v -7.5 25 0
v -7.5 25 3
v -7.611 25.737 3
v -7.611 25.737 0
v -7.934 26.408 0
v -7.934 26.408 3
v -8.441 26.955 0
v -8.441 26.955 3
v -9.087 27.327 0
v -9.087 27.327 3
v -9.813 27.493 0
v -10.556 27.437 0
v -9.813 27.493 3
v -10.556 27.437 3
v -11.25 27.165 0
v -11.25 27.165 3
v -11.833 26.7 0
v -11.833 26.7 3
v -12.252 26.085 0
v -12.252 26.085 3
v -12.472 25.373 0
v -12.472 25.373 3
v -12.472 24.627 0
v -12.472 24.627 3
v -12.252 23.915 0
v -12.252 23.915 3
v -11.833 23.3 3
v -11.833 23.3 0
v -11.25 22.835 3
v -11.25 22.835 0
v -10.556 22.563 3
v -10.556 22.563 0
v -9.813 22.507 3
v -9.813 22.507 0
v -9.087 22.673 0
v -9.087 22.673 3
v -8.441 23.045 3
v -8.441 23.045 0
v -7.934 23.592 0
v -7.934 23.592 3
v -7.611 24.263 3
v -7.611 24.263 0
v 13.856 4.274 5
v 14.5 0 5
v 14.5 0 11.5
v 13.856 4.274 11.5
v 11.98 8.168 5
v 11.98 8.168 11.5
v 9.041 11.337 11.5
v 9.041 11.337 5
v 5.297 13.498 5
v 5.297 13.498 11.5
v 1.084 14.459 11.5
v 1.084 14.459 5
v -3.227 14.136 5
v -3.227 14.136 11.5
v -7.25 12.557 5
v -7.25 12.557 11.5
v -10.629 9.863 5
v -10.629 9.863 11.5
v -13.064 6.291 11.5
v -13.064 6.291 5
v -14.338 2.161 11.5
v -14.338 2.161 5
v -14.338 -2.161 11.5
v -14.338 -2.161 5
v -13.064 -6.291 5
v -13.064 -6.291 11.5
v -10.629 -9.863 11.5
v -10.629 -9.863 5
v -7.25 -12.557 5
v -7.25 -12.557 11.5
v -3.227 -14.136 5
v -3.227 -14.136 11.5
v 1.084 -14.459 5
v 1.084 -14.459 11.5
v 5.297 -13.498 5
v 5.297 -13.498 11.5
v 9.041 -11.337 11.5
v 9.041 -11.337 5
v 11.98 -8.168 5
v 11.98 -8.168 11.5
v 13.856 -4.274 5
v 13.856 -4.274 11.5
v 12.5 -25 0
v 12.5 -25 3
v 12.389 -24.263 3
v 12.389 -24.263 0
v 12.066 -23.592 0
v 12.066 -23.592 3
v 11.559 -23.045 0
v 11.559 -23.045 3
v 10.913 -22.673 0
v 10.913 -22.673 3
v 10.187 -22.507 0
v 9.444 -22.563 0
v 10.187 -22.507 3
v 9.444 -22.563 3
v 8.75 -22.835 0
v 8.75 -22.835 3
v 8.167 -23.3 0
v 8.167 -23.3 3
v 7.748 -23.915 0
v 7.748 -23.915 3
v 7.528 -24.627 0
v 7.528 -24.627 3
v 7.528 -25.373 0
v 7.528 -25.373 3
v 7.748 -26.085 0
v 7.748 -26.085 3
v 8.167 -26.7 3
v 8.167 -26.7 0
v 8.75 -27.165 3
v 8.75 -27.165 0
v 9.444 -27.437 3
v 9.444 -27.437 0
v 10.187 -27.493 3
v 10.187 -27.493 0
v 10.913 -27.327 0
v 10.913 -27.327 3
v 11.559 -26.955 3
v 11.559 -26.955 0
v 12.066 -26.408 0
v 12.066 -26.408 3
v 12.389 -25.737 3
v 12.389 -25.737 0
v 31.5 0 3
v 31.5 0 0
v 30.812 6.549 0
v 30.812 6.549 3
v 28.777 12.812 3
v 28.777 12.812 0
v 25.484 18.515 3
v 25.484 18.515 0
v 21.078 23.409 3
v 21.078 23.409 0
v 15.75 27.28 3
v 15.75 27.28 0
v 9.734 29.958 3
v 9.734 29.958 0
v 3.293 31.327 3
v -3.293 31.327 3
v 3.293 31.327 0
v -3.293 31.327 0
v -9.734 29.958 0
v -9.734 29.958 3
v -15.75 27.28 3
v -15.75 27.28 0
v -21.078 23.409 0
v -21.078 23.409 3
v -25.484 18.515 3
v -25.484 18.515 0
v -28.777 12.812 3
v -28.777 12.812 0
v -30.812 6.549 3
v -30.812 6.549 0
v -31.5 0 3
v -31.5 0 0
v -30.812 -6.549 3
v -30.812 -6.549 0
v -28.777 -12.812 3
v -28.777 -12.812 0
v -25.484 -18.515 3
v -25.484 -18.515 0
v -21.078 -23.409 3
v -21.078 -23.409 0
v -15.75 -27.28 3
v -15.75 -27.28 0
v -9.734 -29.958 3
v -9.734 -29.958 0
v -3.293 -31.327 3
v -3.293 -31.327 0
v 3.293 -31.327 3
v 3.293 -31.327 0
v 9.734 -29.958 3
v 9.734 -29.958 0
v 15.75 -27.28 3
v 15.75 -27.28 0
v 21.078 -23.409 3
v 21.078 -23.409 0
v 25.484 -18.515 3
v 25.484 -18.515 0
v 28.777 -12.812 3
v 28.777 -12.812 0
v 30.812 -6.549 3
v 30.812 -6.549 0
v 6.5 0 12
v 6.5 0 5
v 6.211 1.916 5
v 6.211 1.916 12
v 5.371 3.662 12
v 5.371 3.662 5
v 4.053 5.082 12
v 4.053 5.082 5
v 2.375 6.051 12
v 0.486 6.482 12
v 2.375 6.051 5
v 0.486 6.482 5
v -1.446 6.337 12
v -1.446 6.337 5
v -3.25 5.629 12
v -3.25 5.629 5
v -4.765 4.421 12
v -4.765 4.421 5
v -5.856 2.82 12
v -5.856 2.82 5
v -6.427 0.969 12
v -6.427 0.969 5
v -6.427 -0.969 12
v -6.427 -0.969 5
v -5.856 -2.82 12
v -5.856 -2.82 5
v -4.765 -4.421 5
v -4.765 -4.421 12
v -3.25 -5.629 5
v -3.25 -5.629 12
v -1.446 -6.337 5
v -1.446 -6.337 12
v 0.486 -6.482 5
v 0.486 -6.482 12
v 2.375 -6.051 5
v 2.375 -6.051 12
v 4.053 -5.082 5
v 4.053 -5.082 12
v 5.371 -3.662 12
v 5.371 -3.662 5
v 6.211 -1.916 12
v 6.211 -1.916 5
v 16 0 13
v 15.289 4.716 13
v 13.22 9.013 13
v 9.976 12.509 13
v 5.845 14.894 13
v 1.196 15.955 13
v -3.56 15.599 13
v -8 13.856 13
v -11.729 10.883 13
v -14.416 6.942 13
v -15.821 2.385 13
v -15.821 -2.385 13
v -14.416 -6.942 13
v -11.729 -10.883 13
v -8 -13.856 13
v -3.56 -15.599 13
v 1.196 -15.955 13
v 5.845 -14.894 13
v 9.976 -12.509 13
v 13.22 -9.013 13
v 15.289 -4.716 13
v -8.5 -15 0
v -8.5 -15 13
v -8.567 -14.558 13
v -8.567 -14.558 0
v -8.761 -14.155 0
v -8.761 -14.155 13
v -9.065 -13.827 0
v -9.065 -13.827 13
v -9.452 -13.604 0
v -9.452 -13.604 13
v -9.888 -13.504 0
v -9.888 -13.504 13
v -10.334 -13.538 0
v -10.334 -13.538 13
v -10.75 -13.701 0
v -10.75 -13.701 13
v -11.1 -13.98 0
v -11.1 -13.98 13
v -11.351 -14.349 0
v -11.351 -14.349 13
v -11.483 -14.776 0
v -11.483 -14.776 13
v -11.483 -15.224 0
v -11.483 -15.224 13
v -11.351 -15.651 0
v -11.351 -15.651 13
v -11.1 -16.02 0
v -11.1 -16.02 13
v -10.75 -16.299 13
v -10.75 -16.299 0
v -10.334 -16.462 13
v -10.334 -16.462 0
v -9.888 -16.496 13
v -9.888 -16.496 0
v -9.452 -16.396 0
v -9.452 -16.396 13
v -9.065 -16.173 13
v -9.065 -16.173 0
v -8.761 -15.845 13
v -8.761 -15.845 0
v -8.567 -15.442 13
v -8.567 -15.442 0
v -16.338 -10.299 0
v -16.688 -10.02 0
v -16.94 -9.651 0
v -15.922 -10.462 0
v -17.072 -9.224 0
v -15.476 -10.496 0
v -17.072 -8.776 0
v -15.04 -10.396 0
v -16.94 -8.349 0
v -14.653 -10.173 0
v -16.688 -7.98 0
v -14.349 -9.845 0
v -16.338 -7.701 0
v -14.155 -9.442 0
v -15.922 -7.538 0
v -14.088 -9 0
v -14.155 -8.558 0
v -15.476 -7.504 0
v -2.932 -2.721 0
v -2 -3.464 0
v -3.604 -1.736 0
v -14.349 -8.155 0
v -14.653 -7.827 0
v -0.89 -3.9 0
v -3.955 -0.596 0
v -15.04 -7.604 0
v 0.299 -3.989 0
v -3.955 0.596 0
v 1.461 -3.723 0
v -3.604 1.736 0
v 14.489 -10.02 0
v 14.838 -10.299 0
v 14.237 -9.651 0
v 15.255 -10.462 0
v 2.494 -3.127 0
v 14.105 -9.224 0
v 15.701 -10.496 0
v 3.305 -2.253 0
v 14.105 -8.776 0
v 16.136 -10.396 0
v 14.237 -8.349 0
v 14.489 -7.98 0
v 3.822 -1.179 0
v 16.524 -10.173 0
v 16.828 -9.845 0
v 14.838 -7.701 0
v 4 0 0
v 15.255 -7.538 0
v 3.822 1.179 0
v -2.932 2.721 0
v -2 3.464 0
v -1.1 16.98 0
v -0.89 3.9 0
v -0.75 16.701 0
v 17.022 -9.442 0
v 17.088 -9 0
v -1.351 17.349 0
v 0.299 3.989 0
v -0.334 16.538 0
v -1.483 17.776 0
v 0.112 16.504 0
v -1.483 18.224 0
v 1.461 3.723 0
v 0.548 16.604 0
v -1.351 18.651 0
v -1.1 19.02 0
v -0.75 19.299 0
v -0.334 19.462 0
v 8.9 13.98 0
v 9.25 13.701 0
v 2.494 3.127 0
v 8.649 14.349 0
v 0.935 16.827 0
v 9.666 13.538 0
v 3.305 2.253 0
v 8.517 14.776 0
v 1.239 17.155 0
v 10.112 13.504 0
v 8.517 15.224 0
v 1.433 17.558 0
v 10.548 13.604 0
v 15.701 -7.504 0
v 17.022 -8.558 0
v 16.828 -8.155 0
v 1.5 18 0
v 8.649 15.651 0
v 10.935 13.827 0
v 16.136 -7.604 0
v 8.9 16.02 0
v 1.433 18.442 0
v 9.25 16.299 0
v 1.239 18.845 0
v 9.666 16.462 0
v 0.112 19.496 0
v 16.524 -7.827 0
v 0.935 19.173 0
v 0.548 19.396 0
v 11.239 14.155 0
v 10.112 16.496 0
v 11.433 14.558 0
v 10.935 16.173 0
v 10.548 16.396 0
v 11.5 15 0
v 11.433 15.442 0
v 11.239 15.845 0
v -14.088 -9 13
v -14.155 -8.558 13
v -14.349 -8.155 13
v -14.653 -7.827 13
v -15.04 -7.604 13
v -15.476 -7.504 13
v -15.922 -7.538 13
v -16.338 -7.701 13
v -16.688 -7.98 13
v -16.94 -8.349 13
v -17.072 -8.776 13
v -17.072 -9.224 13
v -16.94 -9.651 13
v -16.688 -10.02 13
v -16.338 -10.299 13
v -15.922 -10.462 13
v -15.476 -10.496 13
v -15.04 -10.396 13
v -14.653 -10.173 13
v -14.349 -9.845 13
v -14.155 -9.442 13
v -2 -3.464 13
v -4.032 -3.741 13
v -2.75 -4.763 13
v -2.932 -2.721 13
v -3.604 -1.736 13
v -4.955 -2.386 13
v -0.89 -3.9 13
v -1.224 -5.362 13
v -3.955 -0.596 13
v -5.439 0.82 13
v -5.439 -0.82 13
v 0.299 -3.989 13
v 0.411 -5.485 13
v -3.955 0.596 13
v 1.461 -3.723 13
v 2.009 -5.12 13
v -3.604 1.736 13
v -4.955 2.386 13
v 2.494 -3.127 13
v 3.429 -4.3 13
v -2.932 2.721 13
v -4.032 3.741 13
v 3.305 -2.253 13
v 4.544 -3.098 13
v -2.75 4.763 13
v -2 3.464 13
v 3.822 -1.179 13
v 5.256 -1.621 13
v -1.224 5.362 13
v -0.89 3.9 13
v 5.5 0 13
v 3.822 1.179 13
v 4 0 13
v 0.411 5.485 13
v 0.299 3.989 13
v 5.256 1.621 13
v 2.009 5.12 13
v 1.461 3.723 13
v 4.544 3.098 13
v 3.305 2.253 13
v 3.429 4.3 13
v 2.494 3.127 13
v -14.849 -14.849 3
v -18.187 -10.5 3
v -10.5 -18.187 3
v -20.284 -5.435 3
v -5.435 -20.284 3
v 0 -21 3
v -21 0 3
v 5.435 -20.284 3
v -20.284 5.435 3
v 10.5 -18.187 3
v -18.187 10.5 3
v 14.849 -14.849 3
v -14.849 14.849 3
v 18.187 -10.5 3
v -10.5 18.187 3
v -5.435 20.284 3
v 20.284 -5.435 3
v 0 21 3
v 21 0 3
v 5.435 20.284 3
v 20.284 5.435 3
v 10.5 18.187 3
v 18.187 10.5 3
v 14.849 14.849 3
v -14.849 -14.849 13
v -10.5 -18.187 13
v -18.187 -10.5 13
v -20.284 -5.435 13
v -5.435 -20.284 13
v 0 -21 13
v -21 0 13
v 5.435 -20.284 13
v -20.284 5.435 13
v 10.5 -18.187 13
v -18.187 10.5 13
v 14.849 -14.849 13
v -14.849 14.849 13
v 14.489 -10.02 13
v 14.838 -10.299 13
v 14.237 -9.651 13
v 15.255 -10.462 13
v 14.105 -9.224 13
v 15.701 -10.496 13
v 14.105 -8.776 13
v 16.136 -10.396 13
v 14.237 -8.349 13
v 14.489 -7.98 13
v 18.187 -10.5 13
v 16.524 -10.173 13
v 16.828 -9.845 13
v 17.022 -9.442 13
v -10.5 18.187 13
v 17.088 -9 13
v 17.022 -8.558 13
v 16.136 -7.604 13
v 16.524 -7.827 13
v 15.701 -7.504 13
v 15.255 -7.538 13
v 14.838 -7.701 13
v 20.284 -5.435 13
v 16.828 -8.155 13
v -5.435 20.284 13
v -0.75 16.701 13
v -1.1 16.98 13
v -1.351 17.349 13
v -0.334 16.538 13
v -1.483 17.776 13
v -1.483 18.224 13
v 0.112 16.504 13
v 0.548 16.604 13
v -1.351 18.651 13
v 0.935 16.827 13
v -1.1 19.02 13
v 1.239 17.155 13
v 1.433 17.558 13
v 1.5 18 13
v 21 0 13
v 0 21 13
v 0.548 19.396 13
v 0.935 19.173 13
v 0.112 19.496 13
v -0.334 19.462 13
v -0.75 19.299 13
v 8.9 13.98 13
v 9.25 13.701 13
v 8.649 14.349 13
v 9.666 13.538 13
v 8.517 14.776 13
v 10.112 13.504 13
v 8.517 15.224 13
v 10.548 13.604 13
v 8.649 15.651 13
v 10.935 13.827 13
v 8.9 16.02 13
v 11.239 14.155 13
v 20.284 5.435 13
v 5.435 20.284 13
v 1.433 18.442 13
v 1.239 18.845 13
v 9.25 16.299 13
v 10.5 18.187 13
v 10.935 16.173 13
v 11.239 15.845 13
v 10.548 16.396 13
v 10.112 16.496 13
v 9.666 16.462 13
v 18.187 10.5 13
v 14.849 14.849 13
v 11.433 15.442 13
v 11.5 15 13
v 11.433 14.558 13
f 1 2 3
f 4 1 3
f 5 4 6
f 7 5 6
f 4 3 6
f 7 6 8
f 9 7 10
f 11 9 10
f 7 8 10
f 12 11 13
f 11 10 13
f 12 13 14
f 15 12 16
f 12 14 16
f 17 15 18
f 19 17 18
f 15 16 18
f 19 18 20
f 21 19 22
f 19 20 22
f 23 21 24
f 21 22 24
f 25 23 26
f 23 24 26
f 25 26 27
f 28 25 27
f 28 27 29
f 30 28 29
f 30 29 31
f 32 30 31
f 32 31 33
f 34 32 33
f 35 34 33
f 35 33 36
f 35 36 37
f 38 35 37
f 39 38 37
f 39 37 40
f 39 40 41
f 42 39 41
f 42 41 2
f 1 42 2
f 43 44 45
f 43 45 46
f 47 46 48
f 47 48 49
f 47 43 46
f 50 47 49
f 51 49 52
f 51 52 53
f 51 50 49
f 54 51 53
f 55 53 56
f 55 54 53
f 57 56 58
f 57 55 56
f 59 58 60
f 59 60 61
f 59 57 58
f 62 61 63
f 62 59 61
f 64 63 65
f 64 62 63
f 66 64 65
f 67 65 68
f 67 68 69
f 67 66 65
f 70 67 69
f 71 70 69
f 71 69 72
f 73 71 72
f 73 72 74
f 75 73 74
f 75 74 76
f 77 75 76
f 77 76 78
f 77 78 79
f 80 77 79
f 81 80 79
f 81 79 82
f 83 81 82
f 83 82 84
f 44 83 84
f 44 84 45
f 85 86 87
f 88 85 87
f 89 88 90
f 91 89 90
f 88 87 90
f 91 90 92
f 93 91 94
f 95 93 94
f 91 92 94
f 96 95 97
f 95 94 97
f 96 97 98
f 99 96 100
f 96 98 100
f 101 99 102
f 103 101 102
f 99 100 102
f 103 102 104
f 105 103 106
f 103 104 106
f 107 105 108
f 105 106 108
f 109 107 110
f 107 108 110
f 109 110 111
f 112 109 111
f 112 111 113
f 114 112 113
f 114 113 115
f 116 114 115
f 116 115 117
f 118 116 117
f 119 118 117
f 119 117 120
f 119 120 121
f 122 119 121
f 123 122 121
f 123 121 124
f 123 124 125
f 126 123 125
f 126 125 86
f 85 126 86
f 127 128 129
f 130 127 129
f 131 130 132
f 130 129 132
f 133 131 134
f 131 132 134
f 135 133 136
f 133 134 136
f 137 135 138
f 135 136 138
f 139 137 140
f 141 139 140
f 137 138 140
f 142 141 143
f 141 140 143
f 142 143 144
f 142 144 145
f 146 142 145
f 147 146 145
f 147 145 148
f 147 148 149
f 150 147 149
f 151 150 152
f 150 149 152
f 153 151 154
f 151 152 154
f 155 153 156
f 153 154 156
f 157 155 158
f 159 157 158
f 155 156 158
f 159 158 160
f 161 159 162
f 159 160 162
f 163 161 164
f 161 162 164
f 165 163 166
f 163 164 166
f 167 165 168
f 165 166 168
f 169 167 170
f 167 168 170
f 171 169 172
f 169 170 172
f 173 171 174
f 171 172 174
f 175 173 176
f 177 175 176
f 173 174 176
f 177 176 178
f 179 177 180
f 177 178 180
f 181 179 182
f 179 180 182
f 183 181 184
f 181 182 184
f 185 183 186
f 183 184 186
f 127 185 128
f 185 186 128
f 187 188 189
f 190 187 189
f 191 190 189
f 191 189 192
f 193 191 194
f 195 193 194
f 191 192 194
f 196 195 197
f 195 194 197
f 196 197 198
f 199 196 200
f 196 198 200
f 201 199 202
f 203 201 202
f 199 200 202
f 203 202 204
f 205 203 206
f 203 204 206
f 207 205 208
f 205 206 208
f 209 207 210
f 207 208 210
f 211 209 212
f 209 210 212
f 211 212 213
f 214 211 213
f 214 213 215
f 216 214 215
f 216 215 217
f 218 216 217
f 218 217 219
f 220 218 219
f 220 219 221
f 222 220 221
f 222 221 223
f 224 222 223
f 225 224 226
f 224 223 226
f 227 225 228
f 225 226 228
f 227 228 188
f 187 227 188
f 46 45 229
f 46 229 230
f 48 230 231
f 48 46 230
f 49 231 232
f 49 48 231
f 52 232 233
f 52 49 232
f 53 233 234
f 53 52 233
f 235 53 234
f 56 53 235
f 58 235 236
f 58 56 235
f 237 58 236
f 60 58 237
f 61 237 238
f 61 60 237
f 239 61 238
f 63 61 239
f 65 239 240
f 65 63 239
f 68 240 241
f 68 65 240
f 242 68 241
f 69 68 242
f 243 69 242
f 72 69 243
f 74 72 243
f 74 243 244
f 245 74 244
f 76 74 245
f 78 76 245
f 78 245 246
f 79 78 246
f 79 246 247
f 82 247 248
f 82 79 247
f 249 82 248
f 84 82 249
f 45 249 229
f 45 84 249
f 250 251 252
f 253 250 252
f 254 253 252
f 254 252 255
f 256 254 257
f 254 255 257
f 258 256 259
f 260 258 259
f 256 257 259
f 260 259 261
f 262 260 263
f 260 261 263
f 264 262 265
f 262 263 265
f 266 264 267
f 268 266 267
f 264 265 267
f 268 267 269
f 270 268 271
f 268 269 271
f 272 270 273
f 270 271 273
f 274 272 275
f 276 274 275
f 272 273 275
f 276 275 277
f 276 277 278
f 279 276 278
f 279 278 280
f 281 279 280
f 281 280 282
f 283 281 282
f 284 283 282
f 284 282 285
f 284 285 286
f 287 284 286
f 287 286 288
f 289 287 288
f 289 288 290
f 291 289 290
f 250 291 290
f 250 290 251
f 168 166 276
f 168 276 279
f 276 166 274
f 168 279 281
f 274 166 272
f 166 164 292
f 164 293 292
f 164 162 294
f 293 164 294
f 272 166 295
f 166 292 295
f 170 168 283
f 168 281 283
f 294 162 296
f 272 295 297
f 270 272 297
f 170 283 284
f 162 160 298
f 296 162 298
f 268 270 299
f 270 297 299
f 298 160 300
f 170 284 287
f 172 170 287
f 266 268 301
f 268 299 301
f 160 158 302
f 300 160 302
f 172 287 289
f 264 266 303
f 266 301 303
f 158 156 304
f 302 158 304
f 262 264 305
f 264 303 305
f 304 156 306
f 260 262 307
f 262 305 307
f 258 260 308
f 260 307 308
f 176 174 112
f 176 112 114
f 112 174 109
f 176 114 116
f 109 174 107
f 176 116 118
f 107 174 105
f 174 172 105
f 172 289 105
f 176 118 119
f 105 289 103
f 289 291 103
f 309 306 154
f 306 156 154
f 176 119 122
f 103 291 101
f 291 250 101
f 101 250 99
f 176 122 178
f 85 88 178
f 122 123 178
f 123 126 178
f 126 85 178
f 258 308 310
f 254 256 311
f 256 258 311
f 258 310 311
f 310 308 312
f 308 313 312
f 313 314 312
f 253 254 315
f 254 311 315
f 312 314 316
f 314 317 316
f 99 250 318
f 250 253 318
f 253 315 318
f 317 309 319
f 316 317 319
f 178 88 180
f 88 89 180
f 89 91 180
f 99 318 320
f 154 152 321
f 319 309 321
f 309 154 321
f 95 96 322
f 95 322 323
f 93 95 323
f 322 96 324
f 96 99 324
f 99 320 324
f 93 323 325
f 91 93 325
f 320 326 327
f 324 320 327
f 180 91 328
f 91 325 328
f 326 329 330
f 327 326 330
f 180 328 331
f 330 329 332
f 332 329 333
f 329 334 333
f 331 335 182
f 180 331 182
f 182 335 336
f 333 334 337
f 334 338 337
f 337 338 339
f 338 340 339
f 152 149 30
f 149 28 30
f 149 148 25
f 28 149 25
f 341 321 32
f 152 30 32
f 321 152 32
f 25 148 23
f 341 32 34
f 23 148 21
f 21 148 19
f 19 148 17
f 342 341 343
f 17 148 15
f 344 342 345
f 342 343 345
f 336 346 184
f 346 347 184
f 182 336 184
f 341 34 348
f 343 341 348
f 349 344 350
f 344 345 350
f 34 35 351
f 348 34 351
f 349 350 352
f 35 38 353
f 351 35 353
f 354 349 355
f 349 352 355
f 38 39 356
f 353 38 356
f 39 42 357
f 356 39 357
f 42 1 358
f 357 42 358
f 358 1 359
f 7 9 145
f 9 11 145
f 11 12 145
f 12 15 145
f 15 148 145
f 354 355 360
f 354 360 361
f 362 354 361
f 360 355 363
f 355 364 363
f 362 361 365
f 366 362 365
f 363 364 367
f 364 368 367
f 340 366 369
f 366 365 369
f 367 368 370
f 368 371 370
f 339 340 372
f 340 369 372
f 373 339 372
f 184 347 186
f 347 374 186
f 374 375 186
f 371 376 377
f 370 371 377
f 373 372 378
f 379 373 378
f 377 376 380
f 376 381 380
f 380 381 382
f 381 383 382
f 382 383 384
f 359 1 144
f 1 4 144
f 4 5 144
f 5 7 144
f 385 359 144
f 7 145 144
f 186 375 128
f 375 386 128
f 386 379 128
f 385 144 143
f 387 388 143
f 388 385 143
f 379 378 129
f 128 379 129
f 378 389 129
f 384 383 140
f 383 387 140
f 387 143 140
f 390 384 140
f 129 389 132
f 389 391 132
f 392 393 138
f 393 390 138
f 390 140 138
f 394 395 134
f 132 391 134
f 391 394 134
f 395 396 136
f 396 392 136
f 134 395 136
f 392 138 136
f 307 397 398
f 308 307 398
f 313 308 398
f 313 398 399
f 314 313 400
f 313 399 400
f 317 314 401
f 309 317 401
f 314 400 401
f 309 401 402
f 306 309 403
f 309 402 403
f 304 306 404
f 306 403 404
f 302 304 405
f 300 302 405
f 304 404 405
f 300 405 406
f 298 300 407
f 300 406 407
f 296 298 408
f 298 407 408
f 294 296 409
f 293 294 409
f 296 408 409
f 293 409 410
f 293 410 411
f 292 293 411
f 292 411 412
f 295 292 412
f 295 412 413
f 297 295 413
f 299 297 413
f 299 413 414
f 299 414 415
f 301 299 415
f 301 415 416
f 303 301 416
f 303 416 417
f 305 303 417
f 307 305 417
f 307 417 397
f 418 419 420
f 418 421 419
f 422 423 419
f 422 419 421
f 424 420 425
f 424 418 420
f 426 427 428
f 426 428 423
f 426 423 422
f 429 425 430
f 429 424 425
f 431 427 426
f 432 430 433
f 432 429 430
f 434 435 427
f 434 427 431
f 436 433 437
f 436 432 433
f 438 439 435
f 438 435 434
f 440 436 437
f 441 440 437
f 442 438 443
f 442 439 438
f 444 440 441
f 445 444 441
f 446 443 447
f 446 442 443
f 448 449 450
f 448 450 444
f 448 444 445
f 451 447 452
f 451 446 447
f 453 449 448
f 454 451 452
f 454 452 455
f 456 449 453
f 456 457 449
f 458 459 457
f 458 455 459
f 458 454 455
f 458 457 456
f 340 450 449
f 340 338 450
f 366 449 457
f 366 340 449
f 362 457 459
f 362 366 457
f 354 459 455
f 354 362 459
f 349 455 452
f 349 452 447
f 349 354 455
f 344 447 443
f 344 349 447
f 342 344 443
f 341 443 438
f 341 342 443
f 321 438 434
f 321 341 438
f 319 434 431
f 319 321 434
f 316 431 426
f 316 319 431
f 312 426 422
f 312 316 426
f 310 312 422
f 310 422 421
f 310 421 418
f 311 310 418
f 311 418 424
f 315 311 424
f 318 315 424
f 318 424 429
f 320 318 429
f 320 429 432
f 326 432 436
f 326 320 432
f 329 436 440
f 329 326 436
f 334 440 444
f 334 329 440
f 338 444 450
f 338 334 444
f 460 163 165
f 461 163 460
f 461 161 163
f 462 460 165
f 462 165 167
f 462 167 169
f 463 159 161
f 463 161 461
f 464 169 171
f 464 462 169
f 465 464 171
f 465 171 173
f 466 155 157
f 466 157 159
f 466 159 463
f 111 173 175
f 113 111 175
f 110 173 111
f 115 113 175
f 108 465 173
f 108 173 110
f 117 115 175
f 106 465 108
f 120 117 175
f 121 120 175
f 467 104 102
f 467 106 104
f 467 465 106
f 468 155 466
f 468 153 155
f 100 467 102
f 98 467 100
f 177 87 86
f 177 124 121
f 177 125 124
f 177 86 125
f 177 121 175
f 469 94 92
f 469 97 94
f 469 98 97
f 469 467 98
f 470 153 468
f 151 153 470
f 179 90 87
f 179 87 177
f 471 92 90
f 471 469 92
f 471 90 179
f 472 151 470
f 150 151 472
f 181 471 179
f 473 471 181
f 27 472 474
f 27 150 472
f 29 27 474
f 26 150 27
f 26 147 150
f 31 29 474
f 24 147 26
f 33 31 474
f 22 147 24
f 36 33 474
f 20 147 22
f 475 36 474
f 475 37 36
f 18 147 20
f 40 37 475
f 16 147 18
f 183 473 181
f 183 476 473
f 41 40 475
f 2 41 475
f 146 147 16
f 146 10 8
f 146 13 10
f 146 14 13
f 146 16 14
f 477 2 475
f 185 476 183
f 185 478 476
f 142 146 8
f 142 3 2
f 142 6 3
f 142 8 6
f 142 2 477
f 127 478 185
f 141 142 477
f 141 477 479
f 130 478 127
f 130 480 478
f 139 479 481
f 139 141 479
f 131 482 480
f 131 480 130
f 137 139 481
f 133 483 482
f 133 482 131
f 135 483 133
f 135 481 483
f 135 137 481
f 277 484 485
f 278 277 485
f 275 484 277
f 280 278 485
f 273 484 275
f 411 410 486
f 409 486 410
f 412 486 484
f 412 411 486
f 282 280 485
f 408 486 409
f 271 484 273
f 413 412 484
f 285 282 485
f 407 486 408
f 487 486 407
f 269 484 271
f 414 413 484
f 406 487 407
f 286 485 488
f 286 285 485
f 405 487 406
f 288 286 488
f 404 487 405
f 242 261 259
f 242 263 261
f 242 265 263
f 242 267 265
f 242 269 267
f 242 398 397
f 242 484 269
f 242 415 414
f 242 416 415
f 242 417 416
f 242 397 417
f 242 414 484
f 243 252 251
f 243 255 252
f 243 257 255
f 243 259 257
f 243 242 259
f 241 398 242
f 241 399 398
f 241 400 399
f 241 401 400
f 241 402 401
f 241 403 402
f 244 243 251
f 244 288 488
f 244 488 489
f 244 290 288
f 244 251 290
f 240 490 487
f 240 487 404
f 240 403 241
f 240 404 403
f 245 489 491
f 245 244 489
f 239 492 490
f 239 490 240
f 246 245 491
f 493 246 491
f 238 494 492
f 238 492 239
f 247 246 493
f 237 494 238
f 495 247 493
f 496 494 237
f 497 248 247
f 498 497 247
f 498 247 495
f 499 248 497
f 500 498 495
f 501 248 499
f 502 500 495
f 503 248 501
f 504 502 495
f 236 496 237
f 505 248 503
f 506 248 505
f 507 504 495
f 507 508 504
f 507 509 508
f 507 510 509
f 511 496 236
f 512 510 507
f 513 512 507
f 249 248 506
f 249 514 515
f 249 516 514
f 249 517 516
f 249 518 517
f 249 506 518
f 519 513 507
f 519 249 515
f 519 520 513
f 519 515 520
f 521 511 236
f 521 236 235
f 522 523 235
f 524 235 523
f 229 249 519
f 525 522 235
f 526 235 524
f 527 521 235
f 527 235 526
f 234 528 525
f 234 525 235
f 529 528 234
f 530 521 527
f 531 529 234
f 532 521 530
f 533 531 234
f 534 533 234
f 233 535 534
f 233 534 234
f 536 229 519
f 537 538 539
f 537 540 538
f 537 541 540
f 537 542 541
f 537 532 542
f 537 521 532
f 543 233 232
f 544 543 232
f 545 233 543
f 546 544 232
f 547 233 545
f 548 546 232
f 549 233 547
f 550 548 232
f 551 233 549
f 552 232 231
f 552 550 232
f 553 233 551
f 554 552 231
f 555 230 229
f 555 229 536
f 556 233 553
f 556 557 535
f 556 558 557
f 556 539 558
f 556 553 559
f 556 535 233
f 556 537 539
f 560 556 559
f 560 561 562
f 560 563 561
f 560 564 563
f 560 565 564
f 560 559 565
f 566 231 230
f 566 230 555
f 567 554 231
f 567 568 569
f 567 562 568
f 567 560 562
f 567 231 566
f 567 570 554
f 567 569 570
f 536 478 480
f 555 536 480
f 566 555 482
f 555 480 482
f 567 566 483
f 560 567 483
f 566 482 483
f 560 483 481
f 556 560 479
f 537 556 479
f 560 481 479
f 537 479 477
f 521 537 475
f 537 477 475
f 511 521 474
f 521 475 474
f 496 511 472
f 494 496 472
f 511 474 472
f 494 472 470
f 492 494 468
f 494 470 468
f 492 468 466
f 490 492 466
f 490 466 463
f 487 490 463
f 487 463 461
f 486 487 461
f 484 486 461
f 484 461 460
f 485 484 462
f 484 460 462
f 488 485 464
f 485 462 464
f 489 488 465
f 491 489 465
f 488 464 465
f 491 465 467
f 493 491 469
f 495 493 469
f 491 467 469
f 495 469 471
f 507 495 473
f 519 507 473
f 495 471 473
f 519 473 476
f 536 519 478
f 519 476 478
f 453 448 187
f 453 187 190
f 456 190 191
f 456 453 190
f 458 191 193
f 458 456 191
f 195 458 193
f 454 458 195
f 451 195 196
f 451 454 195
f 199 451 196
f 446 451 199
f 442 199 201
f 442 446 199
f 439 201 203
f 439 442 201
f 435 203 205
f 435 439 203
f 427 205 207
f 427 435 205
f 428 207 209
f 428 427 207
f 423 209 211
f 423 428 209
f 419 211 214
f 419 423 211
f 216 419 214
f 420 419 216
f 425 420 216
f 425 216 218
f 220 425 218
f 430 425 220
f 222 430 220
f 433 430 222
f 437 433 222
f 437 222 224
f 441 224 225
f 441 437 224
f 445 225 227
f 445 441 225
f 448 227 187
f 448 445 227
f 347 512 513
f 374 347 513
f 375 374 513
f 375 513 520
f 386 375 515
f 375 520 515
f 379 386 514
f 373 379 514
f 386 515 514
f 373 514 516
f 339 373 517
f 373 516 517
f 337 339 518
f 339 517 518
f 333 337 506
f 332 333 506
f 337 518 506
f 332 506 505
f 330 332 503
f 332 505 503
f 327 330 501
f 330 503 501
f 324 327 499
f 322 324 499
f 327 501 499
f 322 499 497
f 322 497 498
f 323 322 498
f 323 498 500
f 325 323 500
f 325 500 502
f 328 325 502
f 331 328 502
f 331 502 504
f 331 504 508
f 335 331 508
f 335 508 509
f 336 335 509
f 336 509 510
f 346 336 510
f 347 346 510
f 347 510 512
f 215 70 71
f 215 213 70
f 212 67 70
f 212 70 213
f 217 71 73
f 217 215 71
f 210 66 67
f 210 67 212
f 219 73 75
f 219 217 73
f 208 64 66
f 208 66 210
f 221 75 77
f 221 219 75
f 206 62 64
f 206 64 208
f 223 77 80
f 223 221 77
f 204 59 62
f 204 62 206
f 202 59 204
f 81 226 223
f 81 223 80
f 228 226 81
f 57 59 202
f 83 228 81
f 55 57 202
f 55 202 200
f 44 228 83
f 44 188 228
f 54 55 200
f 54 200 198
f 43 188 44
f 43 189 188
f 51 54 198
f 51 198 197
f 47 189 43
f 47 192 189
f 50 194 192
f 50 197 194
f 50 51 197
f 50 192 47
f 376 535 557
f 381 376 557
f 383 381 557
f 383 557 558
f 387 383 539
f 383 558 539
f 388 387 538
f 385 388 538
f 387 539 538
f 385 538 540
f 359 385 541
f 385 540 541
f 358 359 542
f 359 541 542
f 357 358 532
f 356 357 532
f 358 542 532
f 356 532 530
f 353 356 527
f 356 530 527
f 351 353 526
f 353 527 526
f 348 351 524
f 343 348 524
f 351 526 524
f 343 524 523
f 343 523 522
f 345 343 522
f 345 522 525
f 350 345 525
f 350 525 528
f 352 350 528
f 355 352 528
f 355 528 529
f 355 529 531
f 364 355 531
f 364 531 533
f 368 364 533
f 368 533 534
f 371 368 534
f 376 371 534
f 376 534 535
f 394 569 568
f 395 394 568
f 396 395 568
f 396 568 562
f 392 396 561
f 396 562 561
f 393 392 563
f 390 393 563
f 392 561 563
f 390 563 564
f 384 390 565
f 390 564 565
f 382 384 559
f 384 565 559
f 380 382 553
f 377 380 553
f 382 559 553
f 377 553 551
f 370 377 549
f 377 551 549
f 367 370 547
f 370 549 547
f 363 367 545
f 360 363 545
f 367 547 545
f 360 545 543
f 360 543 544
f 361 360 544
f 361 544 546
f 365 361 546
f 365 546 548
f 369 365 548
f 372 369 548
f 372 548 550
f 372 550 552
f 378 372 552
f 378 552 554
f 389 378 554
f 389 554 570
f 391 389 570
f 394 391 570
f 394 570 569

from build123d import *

# Parameters (mm, degrees)
SKETCH_R        = 31.5
SKETCH_R_2      = 4
PAD_DEPTH       = 3
SKETCH001_R     = 21
SKETCH001_R_2   = 14.5
PAD001_DEPTH    = 10
SKETCH002_R     = 14.5
SKETCH002_R_2   = 4
PAD002_DEPTH    = 2
SKETCH003_R     = 6.5
SKETCH003_R_2   = 4
PAD003_DEPTH    = 8
SKETCH005_R     = 2.5
SKETCH005_R_2   = 1.5
POCKET001_DEPTH = 3.001
SKETCH008_R     = 1.5
POCKET_DEPTH    = 13.001
SKETCH007_R     = 1.5
POCKET002_DEPTH = 13.001
CHAMFER_SIZE    = 1.5
CHAMFER001_SIZE = 1


with BuildPart() as part:
    # Sketch → Pad (new body)
    with BuildSketch(Plane.XY):
        Circle(SKETCH_R)
        Circle(SKETCH_R_2, mode=Mode.SUBTRACT)
    extrude(amount=PAD_DEPTH)

    # Sketch001 (on Face4 of Pad) → Pad001 (join)
    with BuildSketch(Plane.XY.offset(3)):
        Circle(SKETCH001_R)
        Circle(SKETCH001_R_2, mode=Mode.SUBTRACT)
    extrude(amount=PAD001_DEPTH)

    # Sketch002 (on Face6 of Pad001) → Pad002 (join)
    with BuildSketch(Plane.XY.offset(3)):
        Circle(SKETCH002_R)
        Circle(SKETCH002_R_2, mode=Mode.SUBTRACT)
    extrude(amount=PAD002_DEPTH)

    # Sketch003 (on Face8 of Pad002) → Pad003 (join)
    with BuildSketch(Plane.XY.offset(5)):
        Circle(SKETCH003_R)
        Circle(SKETCH003_R_2, mode=Mode.SUBTRACT)
    extrude(amount=PAD003_DEPTH)

    # Sketch005 (on Face3 of Pad001) → Pocket001 (cut, through all)
    with BuildSketch(Plane.XY.offset(3)):
        with Locations((-10, 25)):
            Circle(SKETCH005_R)
        with Locations((10, -25)):
            Circle(SKETCH005_R)
        with Locations((-10, -15)):
            Circle(SKETCH005_R_2)
        with Locations((10, 15)):
            Circle(SKETCH005_R_2)
    extrude(amount=-POCKET001_DEPTH, mode=Mode.SUBTRACT)

    # Sketch008 → Pocket (cut, through all)
    with BuildSketch(Plane.XY.offset(13)):
        with Locations((0, 18)):
            Circle(SKETCH008_R)
        with Locations((-15.588457, -9)):
            Circle(SKETCH008_R)
        with Locations((15.588457, -9)):
            Circle(SKETCH008_R)
    extrude(amount=-POCKET_DEPTH, mode=Mode.SUBTRACT)

    # Sketch007 (on Face13 of Pocket001) → Pocket002 (cut, through all)
    with BuildSketch(Plane.XY.offset(13)):
        with Locations((10, 15)):
            Circle(SKETCH007_R)
        with Locations((-10, -15)):
            Circle(SKETCH007_R)
    extrude(amount=-POCKET002_DEPTH, mode=Mode.SUBTRACT)

    # Chamfer
    chamfer_edges = [part.edges().sort_by_distance(p)[0] for p in [
        (-14.5, 0, 13),
    ]]
    chamfer(chamfer_edges, length=CHAMFER_SIZE)

    # Chamfer001
    chamfer001_edges = [part.edges().sort_by_distance(p)[0] for p in [
        (-6.5, 0, 13),
    ]]
    chamfer(chamfer001_edges, length=CHAMFER001_SIZE)


solid = part.part
